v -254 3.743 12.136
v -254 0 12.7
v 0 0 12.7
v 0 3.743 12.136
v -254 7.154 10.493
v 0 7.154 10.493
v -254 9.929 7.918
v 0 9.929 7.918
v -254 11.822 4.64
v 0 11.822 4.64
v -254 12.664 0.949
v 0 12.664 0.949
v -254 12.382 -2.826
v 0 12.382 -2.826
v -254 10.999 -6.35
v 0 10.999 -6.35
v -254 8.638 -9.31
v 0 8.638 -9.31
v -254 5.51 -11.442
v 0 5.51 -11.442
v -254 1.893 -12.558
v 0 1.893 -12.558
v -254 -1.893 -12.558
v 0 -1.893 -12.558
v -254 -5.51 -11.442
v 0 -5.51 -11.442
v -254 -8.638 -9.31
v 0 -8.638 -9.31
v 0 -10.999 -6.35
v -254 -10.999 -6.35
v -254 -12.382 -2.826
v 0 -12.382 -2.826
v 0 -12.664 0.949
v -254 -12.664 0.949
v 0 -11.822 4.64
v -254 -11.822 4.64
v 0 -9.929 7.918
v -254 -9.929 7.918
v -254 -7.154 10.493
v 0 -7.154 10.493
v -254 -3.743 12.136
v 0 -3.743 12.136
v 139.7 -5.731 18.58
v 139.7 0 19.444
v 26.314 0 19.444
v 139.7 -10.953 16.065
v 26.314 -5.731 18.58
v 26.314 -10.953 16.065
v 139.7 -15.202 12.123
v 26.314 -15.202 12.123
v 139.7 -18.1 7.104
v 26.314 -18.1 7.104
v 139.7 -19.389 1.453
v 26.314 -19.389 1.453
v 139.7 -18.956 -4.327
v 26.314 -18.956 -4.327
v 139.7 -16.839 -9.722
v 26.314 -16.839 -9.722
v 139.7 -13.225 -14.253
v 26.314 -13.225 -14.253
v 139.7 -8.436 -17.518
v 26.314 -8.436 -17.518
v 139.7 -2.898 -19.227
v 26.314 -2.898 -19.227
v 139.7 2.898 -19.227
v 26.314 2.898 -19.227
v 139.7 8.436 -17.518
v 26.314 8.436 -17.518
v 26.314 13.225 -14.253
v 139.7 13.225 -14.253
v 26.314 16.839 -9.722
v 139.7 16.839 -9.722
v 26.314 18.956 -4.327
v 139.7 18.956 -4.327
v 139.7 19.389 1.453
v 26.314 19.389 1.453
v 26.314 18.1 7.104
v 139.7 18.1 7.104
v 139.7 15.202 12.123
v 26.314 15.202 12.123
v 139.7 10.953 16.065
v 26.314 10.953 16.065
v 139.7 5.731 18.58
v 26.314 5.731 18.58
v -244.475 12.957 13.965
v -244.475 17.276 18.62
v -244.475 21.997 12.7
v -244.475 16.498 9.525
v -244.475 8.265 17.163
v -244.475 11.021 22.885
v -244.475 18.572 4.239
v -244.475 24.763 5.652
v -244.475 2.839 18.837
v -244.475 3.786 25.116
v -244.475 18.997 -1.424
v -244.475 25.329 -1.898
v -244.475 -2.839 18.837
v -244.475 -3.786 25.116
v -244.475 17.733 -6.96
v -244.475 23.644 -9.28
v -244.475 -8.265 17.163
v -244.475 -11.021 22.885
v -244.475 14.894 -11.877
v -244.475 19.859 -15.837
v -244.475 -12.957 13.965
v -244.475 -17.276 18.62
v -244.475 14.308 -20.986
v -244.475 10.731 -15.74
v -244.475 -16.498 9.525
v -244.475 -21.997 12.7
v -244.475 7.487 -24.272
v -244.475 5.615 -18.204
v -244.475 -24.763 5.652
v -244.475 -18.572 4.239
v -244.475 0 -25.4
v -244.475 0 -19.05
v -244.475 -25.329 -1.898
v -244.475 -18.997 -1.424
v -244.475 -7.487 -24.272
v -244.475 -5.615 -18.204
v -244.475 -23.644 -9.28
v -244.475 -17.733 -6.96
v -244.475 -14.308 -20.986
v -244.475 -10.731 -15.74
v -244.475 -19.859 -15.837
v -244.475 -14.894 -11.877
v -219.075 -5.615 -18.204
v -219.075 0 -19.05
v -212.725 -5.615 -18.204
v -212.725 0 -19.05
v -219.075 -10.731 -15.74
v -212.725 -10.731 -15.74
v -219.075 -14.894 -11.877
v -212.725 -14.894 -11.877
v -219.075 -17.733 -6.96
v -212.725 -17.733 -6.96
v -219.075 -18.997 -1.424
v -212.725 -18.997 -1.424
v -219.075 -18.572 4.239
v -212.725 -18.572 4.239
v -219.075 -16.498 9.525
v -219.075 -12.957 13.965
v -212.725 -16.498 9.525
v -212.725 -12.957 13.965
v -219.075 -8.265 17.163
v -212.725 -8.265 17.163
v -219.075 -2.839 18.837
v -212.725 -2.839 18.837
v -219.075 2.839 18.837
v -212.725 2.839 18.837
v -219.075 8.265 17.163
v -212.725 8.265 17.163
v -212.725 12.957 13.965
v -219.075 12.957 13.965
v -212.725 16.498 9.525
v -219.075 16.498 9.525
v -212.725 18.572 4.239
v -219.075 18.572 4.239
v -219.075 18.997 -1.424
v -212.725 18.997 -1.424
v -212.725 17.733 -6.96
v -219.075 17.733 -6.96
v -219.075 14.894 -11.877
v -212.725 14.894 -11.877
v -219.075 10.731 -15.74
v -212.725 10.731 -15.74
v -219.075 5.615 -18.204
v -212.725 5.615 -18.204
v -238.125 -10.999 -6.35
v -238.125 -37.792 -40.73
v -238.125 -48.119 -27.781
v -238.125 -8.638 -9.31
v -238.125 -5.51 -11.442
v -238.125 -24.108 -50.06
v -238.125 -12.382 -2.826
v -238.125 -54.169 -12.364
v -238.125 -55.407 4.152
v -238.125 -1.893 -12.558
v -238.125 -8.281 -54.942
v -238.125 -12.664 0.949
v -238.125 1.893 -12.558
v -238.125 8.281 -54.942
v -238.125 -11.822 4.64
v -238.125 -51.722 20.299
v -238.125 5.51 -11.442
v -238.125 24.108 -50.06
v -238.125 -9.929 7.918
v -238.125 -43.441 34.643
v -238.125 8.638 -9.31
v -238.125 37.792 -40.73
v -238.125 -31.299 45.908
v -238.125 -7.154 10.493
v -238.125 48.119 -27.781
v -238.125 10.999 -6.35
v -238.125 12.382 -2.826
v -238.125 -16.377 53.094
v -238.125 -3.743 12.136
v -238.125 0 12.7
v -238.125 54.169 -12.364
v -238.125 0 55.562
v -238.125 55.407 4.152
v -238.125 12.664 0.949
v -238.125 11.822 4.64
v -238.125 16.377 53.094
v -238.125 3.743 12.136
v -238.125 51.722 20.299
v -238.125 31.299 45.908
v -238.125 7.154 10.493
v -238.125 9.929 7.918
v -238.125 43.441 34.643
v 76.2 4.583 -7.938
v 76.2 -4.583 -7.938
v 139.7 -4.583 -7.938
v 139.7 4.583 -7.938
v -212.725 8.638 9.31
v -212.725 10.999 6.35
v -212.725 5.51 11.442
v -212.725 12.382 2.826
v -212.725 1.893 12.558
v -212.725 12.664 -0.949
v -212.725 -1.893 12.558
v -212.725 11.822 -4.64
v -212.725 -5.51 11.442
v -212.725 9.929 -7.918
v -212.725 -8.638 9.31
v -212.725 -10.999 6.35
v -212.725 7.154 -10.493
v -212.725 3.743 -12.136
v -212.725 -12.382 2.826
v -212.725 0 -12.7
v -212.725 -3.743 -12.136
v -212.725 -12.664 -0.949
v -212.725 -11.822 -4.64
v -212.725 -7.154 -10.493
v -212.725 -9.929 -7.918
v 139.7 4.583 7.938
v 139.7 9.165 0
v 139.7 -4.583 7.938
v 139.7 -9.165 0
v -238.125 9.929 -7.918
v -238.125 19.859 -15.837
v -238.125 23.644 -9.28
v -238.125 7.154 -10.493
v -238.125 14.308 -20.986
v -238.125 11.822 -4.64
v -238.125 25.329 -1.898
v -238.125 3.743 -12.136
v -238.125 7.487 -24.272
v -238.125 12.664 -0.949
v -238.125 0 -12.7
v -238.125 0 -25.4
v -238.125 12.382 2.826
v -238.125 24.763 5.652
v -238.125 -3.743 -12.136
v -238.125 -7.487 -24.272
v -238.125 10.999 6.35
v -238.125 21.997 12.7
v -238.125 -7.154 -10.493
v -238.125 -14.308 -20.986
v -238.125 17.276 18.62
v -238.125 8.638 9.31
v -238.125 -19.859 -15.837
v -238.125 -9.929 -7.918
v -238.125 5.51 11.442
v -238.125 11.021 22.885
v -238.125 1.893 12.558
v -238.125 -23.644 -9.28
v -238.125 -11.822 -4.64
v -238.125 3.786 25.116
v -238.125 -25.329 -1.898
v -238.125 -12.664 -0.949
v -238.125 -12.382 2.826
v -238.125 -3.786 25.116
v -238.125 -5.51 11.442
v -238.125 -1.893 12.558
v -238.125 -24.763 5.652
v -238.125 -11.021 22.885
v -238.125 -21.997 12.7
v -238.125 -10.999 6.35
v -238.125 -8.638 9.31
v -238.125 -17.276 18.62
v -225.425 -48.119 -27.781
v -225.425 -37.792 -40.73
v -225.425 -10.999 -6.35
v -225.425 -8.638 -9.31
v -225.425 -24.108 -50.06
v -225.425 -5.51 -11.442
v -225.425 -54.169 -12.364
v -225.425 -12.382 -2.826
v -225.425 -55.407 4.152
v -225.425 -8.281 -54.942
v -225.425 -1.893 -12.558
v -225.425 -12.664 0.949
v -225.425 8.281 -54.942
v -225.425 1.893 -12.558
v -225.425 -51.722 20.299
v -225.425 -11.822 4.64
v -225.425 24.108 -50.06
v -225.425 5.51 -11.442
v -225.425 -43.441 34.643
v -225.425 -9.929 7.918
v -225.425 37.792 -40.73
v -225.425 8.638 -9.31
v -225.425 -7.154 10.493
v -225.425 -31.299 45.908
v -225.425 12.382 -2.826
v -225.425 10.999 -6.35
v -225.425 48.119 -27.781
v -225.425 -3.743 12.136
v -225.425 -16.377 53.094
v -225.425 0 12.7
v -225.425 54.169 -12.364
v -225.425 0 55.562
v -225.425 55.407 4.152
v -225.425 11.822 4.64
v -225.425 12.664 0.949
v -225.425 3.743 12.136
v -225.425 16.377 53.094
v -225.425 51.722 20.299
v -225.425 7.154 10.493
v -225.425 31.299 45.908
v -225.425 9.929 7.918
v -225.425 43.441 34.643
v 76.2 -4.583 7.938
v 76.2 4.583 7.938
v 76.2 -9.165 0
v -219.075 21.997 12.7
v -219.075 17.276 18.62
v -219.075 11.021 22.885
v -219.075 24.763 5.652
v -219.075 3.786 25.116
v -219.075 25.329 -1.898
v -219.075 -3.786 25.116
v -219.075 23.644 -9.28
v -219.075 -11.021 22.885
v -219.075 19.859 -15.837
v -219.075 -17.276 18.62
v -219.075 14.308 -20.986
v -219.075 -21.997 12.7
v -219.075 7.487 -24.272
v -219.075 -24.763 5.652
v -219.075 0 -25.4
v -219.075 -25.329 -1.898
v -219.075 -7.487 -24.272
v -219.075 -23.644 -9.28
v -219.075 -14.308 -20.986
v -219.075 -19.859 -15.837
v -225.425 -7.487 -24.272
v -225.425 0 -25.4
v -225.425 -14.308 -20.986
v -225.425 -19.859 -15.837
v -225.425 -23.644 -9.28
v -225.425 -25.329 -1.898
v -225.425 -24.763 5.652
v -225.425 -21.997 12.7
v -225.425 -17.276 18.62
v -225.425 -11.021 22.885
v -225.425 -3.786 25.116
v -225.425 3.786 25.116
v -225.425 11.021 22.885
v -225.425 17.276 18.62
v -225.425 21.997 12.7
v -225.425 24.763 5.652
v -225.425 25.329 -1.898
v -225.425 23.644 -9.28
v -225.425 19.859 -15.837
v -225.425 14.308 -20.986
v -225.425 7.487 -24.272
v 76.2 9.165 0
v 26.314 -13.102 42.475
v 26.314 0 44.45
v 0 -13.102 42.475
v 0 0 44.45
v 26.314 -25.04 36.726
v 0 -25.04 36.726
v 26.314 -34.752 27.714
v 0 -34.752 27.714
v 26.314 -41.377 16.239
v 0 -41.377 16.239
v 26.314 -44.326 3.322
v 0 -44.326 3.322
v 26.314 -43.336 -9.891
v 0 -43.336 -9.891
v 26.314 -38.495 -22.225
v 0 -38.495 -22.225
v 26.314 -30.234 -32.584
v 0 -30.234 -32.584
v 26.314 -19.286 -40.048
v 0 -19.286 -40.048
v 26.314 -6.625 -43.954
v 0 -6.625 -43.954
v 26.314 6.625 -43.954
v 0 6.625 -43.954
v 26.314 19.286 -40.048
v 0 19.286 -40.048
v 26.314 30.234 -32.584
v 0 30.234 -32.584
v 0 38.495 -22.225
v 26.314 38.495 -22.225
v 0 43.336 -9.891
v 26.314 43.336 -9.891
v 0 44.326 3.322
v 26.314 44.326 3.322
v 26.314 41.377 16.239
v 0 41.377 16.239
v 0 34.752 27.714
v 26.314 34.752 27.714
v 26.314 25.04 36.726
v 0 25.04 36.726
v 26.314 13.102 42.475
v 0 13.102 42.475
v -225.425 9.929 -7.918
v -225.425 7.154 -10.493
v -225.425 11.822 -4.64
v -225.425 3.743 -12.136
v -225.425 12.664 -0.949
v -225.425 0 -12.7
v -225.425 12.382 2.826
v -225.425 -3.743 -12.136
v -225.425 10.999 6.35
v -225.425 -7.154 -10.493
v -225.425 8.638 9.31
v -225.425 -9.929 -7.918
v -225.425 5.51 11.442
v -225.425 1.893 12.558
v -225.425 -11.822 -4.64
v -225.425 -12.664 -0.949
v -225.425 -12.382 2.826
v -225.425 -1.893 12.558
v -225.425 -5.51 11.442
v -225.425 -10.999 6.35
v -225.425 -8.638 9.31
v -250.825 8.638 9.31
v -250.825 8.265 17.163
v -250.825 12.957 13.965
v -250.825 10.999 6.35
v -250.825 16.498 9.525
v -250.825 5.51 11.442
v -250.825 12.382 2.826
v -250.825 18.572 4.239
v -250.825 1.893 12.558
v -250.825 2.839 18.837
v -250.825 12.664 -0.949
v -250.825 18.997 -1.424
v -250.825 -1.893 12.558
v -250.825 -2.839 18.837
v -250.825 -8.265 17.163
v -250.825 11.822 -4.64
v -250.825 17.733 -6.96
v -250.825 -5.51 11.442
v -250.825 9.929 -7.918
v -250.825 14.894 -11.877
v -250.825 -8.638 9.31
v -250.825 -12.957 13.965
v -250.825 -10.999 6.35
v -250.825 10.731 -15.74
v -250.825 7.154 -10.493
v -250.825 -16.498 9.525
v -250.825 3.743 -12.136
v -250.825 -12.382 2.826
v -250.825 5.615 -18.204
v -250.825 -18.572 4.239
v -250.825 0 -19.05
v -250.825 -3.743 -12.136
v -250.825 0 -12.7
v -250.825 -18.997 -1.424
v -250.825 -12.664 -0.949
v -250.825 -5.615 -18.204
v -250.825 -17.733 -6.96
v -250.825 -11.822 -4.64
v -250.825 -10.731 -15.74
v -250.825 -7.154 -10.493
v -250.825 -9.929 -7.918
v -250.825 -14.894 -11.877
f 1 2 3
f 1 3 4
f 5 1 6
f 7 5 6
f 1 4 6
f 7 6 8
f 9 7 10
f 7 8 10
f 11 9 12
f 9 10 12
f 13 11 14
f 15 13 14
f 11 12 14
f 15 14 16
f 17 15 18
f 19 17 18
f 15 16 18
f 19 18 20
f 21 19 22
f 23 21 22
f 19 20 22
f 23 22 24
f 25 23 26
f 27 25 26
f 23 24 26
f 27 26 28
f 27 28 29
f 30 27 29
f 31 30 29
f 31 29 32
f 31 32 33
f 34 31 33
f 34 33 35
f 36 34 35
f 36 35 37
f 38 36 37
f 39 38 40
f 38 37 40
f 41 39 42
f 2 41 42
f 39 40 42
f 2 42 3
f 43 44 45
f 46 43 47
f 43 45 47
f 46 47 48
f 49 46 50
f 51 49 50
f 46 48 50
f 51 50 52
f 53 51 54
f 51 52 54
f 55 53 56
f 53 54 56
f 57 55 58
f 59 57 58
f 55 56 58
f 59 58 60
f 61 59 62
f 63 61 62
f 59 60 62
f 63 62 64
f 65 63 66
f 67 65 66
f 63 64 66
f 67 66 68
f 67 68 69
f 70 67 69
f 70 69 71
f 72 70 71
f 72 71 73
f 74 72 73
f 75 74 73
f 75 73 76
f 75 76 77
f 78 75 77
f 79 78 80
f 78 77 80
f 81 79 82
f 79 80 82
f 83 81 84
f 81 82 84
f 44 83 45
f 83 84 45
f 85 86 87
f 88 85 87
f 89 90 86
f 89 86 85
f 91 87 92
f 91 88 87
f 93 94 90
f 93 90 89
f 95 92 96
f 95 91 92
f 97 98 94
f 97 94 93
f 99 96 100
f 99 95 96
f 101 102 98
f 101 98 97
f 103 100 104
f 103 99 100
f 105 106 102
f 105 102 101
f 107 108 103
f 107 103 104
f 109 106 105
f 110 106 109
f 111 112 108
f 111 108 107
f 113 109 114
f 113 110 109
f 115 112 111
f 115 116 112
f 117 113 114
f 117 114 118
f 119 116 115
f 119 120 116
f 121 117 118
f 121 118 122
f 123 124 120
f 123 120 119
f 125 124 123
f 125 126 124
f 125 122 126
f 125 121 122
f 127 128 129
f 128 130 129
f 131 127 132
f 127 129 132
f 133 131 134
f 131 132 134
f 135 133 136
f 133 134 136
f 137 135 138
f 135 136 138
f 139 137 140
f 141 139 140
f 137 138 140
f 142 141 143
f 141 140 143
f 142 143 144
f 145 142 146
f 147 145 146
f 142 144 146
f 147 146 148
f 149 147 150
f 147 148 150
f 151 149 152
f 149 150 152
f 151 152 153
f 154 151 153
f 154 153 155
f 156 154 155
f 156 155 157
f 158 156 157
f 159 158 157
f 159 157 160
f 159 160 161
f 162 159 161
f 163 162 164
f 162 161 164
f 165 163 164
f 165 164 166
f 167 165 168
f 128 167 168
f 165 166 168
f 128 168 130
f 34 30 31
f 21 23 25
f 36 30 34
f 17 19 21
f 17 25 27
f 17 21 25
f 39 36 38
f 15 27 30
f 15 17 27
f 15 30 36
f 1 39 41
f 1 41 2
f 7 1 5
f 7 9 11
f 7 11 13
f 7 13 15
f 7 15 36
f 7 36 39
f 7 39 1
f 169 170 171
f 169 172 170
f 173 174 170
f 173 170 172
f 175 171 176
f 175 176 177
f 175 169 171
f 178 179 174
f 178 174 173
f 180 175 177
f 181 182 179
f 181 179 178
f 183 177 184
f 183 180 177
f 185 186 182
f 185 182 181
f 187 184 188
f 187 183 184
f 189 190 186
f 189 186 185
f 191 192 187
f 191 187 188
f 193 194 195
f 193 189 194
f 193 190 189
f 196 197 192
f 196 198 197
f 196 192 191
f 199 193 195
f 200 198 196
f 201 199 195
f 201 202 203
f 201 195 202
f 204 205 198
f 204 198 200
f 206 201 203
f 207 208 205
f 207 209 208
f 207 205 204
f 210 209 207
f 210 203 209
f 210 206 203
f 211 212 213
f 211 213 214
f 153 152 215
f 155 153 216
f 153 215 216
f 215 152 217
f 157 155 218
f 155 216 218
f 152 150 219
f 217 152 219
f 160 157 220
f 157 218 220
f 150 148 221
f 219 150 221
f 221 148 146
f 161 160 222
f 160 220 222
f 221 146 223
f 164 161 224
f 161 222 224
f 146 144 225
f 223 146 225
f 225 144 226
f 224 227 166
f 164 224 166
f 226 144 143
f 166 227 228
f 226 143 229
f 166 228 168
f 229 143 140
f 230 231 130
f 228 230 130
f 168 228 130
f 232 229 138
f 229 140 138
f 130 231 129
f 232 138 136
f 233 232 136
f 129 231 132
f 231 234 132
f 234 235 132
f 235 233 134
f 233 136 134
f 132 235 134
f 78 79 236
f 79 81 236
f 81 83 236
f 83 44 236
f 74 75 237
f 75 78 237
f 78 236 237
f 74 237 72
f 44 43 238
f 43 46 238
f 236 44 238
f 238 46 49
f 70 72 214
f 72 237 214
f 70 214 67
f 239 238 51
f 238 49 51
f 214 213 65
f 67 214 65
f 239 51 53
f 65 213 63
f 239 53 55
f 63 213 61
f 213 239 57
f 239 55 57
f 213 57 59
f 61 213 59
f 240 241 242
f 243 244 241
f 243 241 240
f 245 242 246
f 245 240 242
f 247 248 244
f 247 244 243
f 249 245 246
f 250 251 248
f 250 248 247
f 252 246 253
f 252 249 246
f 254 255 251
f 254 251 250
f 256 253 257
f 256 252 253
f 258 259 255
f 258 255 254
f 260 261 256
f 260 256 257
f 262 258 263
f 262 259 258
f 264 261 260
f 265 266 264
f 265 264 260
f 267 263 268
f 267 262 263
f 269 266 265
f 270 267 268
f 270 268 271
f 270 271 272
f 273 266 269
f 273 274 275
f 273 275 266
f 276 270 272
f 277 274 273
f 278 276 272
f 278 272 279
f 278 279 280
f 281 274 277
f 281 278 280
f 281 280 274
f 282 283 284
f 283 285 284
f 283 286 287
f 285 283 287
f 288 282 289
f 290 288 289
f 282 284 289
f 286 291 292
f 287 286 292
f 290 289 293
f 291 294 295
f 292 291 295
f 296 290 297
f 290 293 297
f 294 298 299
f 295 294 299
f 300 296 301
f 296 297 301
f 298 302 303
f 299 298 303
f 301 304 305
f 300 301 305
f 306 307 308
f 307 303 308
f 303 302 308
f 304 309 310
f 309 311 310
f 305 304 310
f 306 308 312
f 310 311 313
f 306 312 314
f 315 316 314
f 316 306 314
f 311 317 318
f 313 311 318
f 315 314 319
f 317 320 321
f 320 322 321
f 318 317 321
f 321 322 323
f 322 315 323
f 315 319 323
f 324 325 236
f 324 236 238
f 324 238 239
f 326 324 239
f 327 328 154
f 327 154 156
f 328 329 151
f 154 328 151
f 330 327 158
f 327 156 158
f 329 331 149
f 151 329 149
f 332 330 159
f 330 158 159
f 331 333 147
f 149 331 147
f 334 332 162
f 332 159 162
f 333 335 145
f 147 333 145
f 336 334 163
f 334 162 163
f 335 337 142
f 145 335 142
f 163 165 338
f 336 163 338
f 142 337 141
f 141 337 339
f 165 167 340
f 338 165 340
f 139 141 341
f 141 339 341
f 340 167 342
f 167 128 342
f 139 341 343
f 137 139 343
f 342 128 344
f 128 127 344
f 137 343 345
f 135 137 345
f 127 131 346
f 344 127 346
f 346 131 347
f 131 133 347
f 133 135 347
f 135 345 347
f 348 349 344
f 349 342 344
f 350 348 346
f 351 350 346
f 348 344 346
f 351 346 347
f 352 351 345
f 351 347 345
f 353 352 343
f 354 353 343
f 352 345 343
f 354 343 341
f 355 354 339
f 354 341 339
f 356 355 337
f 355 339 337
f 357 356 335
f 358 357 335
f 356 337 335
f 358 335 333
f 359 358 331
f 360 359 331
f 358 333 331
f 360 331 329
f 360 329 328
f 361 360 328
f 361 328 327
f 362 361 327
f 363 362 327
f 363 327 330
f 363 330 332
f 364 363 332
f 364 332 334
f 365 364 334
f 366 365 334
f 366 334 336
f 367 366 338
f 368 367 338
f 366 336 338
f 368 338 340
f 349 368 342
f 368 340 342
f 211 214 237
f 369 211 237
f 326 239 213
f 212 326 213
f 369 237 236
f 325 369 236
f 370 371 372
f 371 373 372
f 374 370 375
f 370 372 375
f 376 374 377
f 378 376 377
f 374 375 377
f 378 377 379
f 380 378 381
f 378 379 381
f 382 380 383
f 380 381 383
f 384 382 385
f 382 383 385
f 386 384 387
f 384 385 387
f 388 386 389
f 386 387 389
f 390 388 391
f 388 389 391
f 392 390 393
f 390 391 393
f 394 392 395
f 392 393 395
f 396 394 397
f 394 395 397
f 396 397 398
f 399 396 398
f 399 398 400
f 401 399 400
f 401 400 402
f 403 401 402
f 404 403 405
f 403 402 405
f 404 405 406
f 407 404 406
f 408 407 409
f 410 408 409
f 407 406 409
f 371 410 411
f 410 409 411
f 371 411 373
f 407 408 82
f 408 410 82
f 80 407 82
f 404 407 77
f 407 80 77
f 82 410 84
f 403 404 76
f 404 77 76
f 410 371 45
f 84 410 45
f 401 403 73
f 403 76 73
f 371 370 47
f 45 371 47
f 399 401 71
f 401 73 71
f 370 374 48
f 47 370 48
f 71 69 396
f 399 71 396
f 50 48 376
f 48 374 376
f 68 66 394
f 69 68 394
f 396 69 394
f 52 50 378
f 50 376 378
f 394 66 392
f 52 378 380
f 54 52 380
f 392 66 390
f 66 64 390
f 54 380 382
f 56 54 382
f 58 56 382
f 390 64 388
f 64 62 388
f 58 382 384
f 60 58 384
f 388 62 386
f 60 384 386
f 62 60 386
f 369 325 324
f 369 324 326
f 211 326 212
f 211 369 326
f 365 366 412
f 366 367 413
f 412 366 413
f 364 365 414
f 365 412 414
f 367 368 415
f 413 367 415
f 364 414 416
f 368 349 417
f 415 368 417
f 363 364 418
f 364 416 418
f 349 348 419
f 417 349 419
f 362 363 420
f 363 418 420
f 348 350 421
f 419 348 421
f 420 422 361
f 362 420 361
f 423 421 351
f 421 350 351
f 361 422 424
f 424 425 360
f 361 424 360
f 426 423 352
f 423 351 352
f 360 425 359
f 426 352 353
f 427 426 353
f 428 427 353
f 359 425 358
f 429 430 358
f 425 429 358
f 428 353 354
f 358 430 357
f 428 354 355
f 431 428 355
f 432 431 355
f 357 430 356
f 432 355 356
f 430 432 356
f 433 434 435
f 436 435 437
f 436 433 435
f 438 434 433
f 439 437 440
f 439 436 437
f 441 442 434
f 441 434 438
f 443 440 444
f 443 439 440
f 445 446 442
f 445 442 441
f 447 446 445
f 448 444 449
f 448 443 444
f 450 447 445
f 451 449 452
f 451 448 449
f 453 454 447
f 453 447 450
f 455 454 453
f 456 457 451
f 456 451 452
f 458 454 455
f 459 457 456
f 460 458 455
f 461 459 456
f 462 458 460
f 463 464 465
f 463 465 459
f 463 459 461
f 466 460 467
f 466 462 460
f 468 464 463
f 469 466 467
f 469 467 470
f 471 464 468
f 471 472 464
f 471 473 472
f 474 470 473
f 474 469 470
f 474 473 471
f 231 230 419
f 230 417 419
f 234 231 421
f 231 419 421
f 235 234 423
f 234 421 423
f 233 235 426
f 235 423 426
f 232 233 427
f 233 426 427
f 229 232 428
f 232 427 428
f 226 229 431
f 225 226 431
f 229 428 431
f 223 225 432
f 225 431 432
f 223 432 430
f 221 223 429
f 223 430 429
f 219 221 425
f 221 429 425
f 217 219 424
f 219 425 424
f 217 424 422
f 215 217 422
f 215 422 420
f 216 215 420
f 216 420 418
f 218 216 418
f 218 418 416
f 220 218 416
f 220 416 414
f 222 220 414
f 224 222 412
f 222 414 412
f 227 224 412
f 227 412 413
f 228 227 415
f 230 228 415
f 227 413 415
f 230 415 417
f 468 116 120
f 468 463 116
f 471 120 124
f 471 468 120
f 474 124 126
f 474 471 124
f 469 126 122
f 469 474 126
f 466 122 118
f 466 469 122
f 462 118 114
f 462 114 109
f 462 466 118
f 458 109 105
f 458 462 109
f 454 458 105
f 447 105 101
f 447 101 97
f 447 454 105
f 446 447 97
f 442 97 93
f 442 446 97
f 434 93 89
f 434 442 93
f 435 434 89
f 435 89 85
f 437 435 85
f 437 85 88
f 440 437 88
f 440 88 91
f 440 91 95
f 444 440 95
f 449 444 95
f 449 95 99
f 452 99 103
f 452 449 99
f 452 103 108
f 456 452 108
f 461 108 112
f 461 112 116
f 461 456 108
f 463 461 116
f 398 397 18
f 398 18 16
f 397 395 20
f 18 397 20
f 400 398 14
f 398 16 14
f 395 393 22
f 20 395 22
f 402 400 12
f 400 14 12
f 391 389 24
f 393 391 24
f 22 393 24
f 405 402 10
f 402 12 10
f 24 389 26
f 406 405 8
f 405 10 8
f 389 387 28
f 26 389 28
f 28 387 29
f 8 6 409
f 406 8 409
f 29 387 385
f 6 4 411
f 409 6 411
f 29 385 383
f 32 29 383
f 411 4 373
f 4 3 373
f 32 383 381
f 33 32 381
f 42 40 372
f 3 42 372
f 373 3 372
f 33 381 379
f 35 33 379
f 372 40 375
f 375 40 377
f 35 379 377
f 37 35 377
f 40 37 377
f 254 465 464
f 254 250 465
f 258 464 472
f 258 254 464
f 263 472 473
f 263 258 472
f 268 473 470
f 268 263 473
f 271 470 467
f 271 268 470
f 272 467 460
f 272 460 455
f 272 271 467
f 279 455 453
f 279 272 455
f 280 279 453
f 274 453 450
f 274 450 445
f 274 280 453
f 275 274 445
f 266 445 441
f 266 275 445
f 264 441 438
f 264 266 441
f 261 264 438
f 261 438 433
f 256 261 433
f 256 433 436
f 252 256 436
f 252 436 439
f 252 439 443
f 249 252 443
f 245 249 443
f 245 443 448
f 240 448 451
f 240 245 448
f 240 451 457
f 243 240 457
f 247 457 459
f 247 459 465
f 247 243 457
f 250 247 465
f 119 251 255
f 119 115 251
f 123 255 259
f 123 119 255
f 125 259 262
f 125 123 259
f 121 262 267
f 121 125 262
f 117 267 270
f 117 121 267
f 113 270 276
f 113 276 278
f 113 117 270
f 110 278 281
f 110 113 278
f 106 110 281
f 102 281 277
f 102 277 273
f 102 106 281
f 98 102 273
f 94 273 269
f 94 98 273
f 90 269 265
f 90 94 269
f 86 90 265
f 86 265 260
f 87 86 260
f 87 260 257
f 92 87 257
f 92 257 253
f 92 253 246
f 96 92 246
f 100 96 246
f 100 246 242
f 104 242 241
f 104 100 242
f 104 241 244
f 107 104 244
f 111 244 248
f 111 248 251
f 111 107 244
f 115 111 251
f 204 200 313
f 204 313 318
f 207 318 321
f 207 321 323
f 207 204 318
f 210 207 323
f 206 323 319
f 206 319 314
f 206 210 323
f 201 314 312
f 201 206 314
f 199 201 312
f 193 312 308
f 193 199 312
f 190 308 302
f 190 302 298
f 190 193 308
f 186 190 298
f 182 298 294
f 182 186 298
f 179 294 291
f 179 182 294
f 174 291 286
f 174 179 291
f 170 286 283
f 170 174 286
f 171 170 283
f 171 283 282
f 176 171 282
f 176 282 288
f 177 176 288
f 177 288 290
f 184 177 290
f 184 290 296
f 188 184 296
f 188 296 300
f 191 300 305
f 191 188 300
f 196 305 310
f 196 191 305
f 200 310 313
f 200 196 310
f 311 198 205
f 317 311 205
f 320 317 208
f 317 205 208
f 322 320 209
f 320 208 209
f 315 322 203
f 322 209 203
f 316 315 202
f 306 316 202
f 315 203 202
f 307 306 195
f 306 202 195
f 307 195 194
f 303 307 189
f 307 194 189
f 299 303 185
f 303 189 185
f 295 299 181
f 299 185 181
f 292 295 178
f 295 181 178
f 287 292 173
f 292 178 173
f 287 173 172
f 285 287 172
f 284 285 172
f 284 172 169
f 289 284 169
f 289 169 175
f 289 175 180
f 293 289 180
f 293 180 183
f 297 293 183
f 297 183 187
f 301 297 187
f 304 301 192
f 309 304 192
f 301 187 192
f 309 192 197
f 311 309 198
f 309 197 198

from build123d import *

# Parameters (mm, degrees)
SKETCH2_R           = 12.7
BOSS_EXTRUDE1_DEPTH = 254
BOSS_EXTRUDE2_START = -15.875
SKETCH4_R           = 55.5625
SKETCH4_R_2         = 12.7
BOSS_EXTRUDE2_DEPTH = 12.7
CUT_EXTRUDE1_DEPTH  = 63.5


with BuildPart() as part:
    # Sketch1 → Revolve_Chuck (revolve)
    with BuildSketch(Plane.XY, mode=Mode.PRIVATE) as revolve_chuck_sk:
        Polygon((139.7, 0), (139.7, 19.4437), (26.3144, 19.4437), (26.3144, 44.45), (0, 44.45), (0, 0), align=None)
    revolve(revolve_chuck_sk.sketch.rotate(Axis((0, 0, 0), (1, 0, 0)), 90), axis=Axis((0, 0, 0), (1, 0, 0)))

    # Sketch2 → Boss-Extrude1 (add)
    with BuildSketch(Plane.ZY):
        Circle(SKETCH2_R)
    extrude(amount=BOSS_EXTRUDE1_DEPTH)

    # Sketch5 → Cut-Extrude1 (cut)
    with BuildSketch(Plane(origin=(139.7, 0, 0), x_dir=(0, 0, -1), z_dir=(1, 0, 0))):
        Polygon((0, 9.165435523), (-7.9375, 4.582717762), (-7.9375, -4.582717762), (0, -9.165435523), (7.9375, -4.582717762), (7.9375, 4.582717762), align=None)
    extrude(amount=-CUT_EXTRUDE1_DEPTH, mode=Mode.SUBTRACT)


with BuildPart() as body_2:
    # Sketch4 → Boss-Extrude2 (new body)
    with BuildSketch(Plane.ZY.offset(254).offset(BOSS_EXTRUDE2_START)):
        Circle(SKETCH4_R)
        Circle(SKETCH4_R_2, mode=Mode.SUBTRACT)
    extrude(amount=-BOSS_EXTRUDE2_DEPTH)


with BuildPart() as body_3:
    # Sketch6 → Revolve1 (revolve)
    with BuildSketch(Plane.XY, mode=Mode.PRIVATE) as revolve1_sk:
        Polygon((-238.125, 12.7), (-238.125, 25.4), (-244.475, 25.4), (-244.475, 19.05), (-250.825, 19.05), (-250.825, 12.7), align=None)
        Polygon((-212.725, 12.7), (-225.425, 12.7), (-225.425, 25.4), (-219.075, 25.4), (-219.075, 19.05), (-212.725, 19.05), align=None)
    revolve(revolve1_sk.sketch.rotate(Axis((-254, 0, 0), (-1, 0, 0)), 90), axis=Axis((-254, 0, 0), (-1, 0, 0)))


solid = Compound([part.part, body_2.part, body_3.part])
